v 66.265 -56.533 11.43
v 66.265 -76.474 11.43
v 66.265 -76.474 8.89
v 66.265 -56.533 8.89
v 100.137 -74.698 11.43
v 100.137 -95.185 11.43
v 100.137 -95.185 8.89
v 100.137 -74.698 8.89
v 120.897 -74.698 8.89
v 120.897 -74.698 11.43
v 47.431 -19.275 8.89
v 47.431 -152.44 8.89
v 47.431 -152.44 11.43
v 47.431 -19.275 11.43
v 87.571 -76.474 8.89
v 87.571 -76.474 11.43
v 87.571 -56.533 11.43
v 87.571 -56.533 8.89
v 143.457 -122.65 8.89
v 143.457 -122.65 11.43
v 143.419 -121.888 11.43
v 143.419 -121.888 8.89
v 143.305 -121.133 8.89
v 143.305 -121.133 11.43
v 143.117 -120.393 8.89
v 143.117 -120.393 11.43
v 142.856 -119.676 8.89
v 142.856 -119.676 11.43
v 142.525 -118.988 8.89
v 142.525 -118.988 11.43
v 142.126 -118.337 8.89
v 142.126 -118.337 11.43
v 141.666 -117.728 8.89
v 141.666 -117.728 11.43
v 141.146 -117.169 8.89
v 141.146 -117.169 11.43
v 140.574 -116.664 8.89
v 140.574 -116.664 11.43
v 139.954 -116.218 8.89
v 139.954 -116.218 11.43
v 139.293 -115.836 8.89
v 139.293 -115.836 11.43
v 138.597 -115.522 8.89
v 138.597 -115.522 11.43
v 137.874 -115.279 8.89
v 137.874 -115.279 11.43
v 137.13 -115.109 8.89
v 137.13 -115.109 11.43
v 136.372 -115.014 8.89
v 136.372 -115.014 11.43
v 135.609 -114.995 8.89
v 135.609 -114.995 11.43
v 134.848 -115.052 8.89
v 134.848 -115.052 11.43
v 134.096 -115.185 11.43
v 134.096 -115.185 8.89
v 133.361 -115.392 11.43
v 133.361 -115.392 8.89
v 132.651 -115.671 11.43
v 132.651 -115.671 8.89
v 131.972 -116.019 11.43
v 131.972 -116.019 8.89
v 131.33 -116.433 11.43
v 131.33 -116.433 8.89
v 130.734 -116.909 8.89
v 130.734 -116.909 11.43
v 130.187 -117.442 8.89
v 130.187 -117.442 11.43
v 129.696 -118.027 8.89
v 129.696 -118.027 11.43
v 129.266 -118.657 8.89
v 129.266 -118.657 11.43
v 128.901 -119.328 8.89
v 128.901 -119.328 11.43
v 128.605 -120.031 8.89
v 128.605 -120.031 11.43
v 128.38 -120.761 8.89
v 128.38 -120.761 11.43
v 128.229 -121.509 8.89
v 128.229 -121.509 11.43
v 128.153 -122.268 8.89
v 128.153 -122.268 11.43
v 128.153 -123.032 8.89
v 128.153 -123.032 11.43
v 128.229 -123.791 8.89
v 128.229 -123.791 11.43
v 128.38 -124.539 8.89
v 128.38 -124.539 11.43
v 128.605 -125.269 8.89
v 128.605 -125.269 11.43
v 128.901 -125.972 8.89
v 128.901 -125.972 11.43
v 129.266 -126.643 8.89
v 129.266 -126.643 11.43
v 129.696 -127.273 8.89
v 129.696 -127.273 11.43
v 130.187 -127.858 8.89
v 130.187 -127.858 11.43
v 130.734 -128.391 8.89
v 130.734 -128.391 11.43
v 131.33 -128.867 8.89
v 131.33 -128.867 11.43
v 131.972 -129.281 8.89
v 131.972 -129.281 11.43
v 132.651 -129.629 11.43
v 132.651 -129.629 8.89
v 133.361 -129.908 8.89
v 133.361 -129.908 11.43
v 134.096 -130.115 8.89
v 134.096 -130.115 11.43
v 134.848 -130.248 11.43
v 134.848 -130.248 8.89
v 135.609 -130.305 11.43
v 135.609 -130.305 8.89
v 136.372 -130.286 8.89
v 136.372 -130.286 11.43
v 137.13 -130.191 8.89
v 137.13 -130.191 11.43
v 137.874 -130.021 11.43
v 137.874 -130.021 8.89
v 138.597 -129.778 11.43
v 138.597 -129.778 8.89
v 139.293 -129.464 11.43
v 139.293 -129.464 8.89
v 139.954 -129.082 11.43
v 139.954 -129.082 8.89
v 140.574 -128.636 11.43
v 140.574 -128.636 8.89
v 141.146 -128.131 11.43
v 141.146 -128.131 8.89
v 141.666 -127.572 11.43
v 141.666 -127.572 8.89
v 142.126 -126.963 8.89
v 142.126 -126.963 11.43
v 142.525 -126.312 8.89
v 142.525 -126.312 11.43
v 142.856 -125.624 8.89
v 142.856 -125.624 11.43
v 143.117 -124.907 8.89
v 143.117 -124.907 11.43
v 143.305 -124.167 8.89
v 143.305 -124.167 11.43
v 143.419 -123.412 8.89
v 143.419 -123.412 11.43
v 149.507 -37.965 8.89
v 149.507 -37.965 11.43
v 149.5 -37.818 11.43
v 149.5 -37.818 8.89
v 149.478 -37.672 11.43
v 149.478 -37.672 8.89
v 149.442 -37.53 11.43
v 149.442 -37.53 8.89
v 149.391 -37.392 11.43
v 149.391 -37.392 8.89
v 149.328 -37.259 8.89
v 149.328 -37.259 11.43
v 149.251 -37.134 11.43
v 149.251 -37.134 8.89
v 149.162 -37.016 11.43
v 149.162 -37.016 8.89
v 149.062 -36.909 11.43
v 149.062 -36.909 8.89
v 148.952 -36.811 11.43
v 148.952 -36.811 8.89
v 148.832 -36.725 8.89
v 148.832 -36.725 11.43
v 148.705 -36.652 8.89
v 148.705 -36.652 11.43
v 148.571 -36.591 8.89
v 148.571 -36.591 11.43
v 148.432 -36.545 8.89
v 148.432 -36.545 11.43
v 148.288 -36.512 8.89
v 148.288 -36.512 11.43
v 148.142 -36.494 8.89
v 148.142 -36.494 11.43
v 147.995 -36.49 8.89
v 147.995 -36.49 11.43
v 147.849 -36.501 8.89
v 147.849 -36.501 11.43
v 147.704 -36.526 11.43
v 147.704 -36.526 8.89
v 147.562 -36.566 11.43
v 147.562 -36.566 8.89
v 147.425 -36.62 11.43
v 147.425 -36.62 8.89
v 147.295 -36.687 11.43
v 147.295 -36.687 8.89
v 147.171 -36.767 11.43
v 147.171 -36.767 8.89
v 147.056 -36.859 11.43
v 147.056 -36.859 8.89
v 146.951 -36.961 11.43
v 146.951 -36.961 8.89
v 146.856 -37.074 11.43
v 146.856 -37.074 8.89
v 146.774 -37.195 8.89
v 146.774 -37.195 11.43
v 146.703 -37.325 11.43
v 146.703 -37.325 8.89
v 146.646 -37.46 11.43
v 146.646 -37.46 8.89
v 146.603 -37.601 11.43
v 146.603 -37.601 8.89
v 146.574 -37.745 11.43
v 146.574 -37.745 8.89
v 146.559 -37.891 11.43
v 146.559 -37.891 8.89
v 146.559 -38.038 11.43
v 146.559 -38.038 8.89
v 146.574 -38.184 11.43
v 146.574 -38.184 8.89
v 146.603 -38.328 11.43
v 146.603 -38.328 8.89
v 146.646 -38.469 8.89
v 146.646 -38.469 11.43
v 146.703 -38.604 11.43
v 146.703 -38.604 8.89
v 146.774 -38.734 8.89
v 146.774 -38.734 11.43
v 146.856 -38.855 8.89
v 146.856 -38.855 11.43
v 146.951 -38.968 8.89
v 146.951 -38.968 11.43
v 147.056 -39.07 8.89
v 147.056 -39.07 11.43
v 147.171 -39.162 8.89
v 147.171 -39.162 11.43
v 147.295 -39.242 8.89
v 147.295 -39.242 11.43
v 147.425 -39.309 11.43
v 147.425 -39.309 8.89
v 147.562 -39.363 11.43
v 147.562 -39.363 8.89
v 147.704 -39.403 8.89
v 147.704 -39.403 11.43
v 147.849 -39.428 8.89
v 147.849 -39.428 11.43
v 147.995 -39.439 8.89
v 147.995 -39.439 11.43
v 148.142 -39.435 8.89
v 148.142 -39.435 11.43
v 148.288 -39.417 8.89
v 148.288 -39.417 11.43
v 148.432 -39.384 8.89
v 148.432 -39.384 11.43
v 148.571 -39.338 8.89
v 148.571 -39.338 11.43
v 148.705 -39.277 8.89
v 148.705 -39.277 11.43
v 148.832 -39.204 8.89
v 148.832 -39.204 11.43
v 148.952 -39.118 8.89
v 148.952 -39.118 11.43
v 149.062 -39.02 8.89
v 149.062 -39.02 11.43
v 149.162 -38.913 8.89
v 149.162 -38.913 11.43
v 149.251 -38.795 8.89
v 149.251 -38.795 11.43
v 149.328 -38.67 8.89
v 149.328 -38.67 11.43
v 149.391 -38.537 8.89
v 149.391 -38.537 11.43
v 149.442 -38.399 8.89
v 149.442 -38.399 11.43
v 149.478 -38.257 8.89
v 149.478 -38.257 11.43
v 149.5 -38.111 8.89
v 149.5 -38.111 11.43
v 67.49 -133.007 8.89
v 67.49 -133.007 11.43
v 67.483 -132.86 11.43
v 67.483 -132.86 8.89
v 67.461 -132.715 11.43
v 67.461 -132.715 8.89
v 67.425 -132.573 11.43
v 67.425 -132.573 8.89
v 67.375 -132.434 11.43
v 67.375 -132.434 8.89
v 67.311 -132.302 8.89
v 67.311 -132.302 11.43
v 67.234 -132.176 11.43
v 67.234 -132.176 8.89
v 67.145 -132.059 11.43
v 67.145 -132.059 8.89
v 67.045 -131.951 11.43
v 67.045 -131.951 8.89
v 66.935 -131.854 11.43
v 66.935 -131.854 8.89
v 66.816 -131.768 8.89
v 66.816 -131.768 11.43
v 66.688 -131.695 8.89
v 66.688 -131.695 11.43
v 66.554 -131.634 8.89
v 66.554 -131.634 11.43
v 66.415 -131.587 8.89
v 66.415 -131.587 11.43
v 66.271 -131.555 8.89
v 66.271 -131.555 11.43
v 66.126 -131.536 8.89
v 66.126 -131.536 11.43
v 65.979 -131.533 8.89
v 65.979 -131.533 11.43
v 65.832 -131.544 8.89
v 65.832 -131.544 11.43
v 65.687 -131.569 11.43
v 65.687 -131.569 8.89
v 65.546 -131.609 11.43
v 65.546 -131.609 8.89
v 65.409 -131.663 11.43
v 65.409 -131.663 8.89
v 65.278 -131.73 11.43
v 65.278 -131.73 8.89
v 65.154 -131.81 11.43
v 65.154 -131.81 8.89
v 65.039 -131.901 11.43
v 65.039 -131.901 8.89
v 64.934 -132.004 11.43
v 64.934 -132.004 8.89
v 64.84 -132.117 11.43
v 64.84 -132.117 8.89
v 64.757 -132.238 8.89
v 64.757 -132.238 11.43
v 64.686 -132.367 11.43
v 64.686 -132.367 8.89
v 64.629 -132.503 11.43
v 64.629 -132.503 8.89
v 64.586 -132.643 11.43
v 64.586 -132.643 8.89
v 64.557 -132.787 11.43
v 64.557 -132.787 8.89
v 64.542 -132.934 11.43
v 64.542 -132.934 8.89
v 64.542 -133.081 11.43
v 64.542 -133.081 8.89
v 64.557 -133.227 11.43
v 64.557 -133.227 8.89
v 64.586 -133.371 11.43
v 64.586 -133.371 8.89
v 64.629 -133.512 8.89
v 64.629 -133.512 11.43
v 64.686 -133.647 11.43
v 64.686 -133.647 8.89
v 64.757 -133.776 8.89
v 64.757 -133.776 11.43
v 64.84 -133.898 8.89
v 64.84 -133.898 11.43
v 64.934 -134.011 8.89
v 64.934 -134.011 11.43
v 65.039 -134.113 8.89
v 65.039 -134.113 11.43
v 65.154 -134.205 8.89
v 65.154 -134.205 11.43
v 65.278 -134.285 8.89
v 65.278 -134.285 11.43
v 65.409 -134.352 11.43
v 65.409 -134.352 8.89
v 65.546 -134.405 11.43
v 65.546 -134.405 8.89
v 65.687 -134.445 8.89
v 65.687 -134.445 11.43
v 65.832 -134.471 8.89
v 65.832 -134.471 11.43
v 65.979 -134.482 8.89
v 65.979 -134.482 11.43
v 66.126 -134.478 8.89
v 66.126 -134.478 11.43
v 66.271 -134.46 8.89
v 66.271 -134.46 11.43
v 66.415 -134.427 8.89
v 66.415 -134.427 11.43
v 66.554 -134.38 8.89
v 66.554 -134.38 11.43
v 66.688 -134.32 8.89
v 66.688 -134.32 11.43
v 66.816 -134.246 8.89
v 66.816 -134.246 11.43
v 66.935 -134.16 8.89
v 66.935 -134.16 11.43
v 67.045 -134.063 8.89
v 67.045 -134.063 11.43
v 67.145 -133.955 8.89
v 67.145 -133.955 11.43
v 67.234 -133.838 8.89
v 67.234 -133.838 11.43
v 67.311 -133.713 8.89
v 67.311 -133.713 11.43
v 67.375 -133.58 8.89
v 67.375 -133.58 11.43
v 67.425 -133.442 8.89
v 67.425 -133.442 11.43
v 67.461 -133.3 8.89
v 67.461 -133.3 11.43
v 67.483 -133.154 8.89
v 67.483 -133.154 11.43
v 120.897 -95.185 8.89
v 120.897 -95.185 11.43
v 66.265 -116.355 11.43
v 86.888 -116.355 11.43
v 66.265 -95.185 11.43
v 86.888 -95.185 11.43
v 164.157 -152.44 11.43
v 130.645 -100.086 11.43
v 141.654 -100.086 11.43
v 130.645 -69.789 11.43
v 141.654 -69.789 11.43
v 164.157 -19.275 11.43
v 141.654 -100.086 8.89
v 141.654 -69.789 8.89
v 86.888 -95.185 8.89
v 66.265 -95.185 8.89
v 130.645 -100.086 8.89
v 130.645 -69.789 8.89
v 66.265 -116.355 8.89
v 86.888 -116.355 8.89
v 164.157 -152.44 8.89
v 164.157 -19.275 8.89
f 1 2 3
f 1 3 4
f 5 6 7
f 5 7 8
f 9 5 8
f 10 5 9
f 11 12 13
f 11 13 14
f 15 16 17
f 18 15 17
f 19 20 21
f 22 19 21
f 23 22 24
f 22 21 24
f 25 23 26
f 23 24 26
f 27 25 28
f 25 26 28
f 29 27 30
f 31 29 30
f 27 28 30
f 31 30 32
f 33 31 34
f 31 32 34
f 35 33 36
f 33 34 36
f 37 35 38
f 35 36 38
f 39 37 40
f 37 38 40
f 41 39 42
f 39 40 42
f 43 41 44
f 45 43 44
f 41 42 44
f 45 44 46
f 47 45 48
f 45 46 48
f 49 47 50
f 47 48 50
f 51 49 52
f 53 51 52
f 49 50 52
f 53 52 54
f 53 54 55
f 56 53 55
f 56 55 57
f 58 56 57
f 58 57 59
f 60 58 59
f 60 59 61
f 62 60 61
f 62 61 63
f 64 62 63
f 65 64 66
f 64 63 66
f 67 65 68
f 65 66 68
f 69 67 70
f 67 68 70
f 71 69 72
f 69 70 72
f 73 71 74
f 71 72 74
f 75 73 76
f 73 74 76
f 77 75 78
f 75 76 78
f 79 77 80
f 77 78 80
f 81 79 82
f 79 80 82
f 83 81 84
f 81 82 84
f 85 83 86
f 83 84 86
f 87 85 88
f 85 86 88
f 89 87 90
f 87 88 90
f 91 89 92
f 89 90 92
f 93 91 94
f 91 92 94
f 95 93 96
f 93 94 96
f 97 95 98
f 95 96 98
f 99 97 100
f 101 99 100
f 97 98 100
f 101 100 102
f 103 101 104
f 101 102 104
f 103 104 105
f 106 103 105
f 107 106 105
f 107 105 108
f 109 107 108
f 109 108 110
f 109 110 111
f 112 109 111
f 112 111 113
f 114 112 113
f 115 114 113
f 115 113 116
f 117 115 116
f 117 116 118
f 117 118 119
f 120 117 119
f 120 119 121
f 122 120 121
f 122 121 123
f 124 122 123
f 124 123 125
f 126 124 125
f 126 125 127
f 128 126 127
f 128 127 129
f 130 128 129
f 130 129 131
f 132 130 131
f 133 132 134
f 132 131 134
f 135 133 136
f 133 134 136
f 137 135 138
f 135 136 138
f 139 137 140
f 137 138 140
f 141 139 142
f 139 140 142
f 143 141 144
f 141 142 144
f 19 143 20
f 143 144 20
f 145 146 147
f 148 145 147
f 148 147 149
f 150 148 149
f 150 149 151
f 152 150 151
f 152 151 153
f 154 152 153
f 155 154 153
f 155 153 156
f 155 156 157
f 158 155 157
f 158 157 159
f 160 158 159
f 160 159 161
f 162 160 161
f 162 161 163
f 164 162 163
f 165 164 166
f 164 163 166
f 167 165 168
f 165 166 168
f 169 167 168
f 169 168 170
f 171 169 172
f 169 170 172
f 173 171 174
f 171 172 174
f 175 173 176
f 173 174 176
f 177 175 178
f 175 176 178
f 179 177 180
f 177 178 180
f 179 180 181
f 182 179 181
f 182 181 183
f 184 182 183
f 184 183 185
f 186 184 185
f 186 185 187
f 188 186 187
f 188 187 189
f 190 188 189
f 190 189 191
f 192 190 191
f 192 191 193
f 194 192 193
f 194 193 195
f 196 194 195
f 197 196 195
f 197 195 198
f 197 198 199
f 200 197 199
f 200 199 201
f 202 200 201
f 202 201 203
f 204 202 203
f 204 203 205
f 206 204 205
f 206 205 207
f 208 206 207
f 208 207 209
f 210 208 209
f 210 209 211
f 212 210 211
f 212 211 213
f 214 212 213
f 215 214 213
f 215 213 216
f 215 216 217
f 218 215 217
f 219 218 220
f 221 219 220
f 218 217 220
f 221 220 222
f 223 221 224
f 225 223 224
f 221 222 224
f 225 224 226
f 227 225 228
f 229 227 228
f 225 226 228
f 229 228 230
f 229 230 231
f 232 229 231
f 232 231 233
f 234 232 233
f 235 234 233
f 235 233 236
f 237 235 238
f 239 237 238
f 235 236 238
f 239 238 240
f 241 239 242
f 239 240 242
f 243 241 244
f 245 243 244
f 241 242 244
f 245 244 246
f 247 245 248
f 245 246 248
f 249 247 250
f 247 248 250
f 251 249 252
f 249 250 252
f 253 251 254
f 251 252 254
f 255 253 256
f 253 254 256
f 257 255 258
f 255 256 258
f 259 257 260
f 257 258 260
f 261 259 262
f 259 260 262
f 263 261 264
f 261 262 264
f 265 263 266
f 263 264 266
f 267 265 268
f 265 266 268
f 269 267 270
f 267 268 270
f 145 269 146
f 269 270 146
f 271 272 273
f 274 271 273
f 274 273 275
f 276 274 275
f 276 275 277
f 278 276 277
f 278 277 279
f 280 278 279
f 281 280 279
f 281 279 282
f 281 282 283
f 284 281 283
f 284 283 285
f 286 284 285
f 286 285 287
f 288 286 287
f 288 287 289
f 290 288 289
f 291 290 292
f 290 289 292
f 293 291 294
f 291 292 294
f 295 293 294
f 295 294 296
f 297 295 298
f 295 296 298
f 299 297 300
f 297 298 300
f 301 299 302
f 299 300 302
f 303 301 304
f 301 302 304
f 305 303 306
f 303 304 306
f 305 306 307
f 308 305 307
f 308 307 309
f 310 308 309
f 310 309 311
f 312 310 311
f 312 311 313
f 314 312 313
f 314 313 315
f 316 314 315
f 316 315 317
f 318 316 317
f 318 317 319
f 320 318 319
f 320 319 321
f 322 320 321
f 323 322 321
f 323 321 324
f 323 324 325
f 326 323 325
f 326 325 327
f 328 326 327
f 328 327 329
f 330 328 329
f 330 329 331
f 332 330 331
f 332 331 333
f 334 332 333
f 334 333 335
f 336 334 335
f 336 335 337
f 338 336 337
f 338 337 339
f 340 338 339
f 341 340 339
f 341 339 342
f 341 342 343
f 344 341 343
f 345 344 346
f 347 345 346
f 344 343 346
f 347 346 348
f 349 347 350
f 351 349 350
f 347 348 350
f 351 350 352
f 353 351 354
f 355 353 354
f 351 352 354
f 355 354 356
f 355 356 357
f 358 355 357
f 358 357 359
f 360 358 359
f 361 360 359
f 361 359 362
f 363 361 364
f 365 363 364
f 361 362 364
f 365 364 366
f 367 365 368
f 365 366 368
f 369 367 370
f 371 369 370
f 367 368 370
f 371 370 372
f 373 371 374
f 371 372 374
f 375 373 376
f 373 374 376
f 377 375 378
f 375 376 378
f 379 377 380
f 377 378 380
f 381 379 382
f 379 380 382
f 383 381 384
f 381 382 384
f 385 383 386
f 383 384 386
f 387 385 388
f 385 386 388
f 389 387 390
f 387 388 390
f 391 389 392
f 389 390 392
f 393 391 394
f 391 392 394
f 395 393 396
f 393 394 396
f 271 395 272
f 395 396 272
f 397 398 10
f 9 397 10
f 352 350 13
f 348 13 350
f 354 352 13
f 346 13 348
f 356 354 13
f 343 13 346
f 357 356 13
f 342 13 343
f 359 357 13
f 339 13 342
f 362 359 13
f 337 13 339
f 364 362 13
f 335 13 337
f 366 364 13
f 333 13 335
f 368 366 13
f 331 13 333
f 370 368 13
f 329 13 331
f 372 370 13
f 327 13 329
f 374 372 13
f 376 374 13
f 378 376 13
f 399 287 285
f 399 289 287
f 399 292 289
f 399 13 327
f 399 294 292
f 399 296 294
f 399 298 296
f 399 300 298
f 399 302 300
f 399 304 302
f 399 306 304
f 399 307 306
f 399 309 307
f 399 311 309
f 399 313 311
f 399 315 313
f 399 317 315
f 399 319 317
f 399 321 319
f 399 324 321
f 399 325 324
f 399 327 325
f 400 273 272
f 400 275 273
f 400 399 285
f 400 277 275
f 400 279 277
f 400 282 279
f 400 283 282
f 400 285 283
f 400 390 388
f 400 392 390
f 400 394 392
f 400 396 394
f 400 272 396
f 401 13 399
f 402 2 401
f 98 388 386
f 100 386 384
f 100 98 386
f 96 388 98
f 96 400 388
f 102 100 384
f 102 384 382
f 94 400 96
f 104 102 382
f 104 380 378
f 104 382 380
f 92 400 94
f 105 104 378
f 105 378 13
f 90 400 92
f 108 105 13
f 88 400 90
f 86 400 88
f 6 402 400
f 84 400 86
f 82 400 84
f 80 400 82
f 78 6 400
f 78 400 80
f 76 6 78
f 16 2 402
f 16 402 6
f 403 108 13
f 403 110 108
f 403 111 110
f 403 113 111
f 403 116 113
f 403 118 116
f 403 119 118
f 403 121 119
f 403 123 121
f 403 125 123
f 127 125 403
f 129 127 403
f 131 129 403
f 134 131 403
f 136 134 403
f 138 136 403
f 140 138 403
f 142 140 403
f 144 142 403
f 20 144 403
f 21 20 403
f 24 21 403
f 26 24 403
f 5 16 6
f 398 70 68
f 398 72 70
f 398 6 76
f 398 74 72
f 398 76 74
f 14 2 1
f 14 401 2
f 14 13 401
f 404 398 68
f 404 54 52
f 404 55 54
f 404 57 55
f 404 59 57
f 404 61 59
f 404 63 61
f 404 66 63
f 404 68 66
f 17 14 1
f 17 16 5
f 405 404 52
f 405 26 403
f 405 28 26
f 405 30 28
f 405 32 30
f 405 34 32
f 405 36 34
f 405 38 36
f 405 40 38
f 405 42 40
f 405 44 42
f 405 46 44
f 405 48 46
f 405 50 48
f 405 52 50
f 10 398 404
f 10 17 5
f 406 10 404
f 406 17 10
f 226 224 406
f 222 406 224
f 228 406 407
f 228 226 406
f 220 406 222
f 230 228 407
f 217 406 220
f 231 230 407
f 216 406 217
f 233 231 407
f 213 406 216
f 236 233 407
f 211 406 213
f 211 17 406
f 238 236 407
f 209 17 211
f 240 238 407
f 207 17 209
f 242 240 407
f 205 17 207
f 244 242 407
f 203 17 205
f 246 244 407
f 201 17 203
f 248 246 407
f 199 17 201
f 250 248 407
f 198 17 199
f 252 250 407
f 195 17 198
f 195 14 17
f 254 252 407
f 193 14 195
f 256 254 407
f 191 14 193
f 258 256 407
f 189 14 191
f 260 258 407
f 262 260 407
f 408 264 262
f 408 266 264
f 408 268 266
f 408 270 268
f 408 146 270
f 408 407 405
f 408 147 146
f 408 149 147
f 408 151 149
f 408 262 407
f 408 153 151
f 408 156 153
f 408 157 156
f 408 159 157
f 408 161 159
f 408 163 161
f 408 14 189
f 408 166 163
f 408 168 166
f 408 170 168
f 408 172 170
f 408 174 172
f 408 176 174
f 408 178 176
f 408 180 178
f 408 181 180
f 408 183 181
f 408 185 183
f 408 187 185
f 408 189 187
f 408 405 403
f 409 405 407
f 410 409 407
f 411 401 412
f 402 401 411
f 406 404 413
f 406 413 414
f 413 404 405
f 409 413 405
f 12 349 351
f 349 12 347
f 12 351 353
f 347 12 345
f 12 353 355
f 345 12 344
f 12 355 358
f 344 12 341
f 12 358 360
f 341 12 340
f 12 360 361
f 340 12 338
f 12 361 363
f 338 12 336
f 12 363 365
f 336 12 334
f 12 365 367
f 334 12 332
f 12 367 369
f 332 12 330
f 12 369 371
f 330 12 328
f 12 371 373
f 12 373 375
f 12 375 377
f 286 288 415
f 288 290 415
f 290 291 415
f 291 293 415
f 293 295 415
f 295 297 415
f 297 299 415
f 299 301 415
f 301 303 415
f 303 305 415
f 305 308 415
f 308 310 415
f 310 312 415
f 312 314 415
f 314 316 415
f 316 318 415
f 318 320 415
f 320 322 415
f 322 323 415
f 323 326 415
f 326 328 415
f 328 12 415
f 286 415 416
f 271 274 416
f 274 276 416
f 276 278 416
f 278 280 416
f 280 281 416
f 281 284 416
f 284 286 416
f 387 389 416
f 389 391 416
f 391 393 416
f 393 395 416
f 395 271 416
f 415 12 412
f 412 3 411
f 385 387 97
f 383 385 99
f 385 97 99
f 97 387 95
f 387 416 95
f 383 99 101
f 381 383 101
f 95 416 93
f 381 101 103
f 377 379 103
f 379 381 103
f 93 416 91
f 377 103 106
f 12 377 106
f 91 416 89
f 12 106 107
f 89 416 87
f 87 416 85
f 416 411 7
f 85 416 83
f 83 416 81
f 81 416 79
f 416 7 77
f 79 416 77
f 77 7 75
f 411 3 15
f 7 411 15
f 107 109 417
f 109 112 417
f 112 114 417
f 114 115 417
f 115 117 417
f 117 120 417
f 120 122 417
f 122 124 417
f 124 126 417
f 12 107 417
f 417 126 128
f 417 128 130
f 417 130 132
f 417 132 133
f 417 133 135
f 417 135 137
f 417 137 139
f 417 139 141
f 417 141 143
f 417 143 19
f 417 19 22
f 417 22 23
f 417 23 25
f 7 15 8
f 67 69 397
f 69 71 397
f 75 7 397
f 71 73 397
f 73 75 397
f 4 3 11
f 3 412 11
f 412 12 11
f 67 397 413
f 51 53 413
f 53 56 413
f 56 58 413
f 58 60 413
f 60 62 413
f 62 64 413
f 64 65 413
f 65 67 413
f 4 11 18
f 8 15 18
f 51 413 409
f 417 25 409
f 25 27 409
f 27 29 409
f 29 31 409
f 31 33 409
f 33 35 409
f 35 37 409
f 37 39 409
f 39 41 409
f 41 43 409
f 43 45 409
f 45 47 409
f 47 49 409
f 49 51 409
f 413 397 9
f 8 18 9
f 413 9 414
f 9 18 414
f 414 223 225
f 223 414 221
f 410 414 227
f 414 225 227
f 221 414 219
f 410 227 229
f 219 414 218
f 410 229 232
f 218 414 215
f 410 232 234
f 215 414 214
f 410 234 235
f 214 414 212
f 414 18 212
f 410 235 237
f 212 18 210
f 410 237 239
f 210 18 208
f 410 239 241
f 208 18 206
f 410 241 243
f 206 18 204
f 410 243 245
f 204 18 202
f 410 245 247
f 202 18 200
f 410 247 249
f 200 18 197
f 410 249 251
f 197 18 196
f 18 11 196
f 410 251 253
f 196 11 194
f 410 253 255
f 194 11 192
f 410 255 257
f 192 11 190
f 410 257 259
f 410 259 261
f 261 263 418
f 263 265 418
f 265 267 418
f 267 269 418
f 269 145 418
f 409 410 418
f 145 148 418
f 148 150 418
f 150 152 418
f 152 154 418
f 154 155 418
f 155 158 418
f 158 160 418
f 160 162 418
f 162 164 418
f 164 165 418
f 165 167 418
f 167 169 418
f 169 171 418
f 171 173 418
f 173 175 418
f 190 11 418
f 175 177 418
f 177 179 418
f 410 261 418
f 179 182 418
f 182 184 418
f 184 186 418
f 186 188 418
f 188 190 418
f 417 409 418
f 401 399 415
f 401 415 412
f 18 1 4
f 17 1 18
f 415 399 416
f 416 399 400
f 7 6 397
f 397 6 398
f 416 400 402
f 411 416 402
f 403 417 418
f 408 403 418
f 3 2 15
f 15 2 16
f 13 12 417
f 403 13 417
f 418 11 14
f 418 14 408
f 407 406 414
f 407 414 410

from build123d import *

# Parameters (mm, degrees)
SKETCH2_W           = 116.725527873
SKETCH2_H           = 133.165089742
BOSS_EXTRUDE1_DEPTH = 2.54
SKETCH3_W           = 20.623543236
SKETCH3_H           = 21.169862262
SKETCH3_W_2         = 20.760122992
SKETCH3_H_2         = 20.48696348
SKETCH3_W_3         = 21.306442018
SKETCH3_H_3         = 19.940644453
CUT_EXTRUDE1_DEPTH  = 2.54
SKETCH5_R           = 7.656955564
CUT_EXTRUDE3_DEPTH  = 2.54
SKETCH7_W           = 11.00850593
SKETCH7_H           = 30.296913756
CUT_EXTRUDE4_DEPTH  = 2.54
SKETCH8_R           = 1.475
CUT_EXTRUDE6_DEPTH  = 2.95


with BuildPart() as part:
    # Sketch2 → Boss-Extrude1 (new body)
    with BuildSketch(Plane.XY.offset(8.89)):
        with Locations((105.793885205, -85.85721005)):
            Rectangle(SKETCH2_W, SKETCH2_H)
    extrude(amount=BOSS_EXTRUDE1_DEPTH)

    # Sketch3 → Cut-Extrude1 (cut)
    with BuildSketch(Plane.XY.offset(11.43)):
        with Locations((76.576493833, -105.769912046)):
            Rectangle(SKETCH3_W, SKETCH3_H)
        with Locations((110.51656333, -84.941499175)):
            Rectangle(SKETCH3_W_2, SKETCH3_H_2)
        with Locations((76.917943224, -66.503232044)):
            Rectangle(SKETCH3_W_3, SKETCH3_H_3)
    extrude(amount=-CUT_EXTRUDE1_DEPTH, mode=Mode.SUBTRACT)

    # Sketch5 → Cut-Extrude3 (cut)
    with BuildSketch(Plane.XY.offset(11.43)):
        with Locations((135.8, -122.65)):
            Circle(SKETCH5_R)
    extrude(amount=-CUT_EXTRUDE3_DEPTH, mode=Mode.SUBTRACT)

    # Sketch7 → Cut-Extrude4 (cut)
    with BuildSketch(Plane.XY.offset(11.43)):
        with Locations((136.149279083, -84.937713867)):
            Rectangle(SKETCH7_W, SKETCH7_H)
    extrude(amount=-CUT_EXTRUDE4_DEPTH, mode=Mode.SUBTRACT)

    # Sketch8 → Cut-Extrude6 (cut)
    with BuildSketch(Plane.XY.offset(11.43)):
        with Locations((66.015339877, -133.007279185)):
            Circle(SKETCH8_R)
        with Locations((148.032128518, -37.964511979)):
            Circle(SKETCH8_R)
    extrude(amount=-CUT_EXTRUDE6_DEPTH, mode=Mode.SUBTRACT)


solid = part.part
